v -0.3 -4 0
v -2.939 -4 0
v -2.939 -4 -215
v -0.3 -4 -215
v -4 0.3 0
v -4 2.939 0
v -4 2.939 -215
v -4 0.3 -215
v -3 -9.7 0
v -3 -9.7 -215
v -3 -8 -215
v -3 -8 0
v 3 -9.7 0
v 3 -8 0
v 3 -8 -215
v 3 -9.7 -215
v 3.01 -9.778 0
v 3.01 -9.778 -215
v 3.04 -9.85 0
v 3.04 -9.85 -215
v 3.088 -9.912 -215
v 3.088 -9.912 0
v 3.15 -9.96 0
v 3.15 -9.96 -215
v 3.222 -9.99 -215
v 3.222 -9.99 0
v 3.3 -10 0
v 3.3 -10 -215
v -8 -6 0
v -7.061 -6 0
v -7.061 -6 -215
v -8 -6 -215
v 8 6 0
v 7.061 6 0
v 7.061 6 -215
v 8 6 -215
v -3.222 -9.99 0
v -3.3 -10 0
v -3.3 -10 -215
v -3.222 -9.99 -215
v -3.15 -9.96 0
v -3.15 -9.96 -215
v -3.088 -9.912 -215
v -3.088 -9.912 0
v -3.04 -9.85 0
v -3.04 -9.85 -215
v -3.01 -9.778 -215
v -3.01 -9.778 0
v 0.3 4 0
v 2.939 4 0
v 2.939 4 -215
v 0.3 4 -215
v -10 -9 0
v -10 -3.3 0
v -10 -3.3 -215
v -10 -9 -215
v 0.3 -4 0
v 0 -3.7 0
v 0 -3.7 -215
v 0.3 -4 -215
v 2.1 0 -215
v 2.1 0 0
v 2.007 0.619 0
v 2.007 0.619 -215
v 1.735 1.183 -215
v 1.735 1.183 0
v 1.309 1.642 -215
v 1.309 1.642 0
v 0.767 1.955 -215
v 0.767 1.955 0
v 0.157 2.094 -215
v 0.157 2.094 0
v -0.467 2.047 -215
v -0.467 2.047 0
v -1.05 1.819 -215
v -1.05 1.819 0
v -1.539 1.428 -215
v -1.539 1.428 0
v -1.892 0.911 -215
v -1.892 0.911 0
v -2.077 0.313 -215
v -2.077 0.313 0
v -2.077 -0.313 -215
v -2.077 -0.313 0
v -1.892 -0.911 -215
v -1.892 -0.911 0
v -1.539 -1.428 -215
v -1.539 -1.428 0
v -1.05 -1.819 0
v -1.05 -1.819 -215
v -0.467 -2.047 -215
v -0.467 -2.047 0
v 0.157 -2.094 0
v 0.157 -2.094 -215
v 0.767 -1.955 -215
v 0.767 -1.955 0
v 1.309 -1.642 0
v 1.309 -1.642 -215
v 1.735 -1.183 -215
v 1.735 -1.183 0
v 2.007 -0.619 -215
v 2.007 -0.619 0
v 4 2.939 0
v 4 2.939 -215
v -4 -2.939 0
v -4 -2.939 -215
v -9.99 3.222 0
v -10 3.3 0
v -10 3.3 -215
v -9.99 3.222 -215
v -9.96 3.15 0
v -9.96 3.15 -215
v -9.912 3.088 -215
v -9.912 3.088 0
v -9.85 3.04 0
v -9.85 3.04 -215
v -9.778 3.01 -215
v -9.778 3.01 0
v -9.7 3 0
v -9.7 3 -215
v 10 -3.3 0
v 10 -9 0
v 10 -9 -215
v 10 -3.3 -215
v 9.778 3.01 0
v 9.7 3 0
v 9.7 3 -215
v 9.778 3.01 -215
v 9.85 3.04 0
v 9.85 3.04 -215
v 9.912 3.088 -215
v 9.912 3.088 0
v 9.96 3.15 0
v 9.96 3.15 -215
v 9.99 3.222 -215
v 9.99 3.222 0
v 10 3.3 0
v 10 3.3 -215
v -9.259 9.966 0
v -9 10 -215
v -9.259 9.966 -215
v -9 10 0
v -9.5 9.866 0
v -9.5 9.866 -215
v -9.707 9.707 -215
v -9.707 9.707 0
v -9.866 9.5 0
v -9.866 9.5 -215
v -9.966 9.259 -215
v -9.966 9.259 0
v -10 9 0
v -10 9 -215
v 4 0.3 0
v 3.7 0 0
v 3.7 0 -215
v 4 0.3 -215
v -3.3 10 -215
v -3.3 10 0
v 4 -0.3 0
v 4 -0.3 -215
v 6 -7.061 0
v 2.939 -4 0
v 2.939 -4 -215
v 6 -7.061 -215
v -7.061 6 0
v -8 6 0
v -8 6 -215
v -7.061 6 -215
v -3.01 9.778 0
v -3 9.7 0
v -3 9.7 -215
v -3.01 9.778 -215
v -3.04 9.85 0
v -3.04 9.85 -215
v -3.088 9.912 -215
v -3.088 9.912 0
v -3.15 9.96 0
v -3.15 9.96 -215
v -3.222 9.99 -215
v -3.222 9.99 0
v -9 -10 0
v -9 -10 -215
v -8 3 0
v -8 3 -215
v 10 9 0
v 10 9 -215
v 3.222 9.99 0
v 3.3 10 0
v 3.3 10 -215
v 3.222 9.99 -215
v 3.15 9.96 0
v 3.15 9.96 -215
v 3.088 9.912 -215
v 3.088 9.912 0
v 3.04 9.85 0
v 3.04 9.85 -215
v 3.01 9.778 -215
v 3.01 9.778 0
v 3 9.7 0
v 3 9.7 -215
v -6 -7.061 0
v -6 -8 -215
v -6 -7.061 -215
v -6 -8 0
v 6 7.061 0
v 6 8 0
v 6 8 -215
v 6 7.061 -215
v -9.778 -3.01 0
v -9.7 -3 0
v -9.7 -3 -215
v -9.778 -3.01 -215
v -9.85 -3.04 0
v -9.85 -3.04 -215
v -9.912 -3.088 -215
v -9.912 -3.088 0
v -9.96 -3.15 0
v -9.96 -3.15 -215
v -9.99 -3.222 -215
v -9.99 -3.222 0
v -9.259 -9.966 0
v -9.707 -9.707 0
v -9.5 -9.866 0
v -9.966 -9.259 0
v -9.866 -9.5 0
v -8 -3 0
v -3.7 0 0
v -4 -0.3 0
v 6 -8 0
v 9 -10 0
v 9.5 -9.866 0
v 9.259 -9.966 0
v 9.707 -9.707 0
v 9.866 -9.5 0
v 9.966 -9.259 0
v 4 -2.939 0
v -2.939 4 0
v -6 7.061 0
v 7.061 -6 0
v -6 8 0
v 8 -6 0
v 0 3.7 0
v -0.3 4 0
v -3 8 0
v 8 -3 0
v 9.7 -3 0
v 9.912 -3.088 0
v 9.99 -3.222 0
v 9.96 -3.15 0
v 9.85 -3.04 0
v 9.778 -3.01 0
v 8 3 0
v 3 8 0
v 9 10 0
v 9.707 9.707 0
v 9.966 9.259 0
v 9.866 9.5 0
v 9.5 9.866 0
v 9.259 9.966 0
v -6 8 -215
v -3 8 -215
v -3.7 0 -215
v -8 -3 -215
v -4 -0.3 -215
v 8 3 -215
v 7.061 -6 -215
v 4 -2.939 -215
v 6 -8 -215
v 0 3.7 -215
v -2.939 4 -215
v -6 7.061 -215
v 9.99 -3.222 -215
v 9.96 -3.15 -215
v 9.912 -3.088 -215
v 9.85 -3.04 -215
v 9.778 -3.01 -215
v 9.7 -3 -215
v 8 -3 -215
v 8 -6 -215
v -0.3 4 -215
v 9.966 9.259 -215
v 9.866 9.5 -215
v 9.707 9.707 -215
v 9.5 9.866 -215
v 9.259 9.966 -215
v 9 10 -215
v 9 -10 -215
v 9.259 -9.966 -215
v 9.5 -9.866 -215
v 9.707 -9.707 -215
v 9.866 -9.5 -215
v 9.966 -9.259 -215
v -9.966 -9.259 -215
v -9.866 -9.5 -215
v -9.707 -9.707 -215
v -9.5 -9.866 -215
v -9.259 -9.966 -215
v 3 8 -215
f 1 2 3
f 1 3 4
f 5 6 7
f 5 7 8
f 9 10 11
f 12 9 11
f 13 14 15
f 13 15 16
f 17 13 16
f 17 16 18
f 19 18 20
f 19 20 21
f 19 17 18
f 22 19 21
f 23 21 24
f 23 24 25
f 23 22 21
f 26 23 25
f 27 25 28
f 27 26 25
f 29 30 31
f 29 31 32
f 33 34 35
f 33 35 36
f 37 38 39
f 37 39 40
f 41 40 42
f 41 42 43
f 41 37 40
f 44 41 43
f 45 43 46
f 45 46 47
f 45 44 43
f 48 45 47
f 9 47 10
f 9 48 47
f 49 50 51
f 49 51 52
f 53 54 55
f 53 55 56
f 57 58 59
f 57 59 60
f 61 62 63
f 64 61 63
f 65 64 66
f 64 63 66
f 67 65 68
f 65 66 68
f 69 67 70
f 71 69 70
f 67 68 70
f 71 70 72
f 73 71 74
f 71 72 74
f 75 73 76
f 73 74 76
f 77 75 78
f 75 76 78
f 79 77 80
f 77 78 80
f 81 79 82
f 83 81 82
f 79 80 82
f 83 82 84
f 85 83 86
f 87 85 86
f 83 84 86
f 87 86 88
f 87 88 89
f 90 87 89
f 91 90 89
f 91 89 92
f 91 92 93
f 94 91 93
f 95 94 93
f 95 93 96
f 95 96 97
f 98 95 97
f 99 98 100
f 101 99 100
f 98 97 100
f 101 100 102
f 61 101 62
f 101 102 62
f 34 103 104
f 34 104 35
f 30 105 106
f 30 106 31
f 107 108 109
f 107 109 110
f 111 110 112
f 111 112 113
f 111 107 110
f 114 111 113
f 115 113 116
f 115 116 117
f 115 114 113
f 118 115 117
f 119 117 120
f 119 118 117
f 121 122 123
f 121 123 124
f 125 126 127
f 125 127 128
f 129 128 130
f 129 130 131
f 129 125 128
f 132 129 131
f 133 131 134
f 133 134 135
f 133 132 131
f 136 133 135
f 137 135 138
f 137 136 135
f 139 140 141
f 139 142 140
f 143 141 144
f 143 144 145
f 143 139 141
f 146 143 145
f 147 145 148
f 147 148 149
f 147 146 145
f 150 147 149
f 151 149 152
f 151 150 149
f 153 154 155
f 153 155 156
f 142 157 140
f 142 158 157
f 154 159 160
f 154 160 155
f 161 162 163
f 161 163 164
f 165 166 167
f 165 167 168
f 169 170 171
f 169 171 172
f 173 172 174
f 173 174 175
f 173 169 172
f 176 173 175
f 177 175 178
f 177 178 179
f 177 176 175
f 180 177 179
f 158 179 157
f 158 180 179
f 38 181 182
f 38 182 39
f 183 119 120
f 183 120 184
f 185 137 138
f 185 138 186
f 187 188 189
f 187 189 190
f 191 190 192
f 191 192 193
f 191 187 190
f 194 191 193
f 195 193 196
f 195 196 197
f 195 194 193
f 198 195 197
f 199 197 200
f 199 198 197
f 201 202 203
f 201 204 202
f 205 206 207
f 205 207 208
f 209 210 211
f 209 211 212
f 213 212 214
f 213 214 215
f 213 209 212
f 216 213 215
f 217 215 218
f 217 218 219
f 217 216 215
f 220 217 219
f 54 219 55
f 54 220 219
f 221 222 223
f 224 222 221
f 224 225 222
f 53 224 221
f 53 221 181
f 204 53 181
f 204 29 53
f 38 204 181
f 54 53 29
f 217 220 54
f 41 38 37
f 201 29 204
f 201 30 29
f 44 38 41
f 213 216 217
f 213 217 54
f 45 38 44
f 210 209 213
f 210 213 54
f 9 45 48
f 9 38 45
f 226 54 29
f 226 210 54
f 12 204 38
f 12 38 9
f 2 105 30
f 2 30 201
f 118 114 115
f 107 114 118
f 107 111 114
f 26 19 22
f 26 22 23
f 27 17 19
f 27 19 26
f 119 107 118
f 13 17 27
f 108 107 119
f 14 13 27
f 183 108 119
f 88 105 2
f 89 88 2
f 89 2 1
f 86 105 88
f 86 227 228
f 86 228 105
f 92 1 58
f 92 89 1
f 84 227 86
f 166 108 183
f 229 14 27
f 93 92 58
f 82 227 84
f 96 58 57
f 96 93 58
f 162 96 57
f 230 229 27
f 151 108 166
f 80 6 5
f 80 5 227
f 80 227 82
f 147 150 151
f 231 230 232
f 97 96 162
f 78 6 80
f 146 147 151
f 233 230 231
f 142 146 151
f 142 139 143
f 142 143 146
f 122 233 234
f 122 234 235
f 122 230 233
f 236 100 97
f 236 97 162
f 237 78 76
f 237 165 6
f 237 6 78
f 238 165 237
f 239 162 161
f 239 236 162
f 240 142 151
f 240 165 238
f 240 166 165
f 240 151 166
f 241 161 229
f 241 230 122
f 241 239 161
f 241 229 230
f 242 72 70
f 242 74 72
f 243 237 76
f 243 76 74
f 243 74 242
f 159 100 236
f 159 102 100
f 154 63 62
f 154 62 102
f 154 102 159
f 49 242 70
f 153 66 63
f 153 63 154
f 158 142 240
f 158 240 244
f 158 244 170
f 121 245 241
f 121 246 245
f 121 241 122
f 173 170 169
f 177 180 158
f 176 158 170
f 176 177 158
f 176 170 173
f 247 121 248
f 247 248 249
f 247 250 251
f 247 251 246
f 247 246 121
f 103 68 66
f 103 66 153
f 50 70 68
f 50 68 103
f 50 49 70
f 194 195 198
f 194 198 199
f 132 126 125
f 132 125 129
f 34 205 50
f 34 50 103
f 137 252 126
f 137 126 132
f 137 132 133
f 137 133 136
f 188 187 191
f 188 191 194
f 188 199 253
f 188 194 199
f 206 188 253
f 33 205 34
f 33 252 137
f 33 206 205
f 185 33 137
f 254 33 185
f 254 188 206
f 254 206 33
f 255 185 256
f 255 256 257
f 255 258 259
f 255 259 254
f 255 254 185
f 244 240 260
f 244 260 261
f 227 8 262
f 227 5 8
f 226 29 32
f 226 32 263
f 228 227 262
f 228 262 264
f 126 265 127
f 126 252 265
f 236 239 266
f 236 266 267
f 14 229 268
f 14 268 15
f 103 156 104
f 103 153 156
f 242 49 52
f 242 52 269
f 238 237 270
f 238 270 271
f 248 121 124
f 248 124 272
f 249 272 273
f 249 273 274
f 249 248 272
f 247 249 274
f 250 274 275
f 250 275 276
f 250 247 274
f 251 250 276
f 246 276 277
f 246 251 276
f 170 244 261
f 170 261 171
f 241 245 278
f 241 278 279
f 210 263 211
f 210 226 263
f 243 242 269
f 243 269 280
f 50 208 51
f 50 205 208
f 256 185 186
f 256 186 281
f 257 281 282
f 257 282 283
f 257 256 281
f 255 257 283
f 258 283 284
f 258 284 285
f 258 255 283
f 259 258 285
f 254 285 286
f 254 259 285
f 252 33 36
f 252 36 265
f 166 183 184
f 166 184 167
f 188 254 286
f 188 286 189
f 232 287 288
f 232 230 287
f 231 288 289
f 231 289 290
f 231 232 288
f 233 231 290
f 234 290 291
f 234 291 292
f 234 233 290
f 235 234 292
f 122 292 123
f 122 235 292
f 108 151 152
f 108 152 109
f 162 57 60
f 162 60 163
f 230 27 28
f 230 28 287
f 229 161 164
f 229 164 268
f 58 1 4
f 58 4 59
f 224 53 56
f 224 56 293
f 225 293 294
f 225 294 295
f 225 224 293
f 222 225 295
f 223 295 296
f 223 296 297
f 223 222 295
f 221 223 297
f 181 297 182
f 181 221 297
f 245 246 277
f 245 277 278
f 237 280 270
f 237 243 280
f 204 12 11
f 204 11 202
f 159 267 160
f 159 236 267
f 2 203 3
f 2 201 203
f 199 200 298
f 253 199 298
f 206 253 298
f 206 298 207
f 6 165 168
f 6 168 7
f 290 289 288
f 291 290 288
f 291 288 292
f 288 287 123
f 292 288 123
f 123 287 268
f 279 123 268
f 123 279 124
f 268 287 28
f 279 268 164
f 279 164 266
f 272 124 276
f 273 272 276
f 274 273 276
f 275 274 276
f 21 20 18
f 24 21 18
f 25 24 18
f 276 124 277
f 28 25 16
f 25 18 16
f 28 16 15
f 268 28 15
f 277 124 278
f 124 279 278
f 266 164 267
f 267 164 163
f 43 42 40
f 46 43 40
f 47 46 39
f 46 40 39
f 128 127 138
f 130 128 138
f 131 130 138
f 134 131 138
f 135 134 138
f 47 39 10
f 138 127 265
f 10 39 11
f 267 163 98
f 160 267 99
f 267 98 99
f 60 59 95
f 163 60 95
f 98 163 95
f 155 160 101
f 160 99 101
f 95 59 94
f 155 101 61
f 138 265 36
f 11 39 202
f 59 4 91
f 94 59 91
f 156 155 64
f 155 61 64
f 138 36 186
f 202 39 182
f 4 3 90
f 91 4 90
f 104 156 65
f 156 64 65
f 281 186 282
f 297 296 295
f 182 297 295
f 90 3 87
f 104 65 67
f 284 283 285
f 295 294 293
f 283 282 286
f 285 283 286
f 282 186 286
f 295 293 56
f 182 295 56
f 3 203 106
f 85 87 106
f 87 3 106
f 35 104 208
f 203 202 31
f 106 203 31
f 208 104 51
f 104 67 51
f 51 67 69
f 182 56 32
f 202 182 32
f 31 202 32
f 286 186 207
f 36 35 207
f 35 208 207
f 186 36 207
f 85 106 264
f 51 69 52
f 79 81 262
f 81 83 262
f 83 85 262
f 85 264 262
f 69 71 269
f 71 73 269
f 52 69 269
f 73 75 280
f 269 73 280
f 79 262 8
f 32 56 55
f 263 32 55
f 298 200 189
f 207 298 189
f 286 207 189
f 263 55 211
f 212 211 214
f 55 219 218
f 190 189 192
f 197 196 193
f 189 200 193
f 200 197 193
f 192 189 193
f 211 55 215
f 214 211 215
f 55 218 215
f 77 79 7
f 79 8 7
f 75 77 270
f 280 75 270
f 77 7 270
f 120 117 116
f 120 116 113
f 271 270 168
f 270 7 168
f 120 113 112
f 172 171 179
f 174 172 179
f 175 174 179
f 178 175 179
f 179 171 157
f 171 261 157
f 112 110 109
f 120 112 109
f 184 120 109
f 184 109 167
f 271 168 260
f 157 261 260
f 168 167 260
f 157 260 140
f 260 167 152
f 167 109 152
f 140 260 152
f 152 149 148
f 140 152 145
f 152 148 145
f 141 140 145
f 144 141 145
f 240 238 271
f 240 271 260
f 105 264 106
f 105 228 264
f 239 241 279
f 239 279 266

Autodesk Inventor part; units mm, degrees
sketch "Sketch_5" plane through (0, 0, 0) normal (0, 0, 1) x (1, 0, 0)
  arc A0 (-10, 3.3) -> (-9.7, 3) centre (-9.7, 3.3) ccw
  line L0 (-9.7, 3) -> (-8, 3)
  line L1 (-8, 3) -> (-8, 6)
  line L2 (-8, 6) -> (-7.0607, 6)
  line L3 (-7.0607, 6) -> (-4, 2.9393)
  line L4 (-4, 2.9393) -> (-4, 0.3)
  line L5 (-4, 0.3) -> (-3.7, 0)
  line L6 (-3.7, 0) -> (-4, -0.3)
  line L7 (-4, -0.3) -> (-4, -2.9393)
  line L8 (-4, -2.9393) -> (-7.0607, -6)
  line L9 (-7.0607, -6) -> (-8, -6)
  line L10 (-8, -6) -> (-8, -3)
  line L11 (-8, -3) -> (-9.7, -3)
  arc A1 (-9.7, -3) -> (-10, -3.3) centre (-9.7, -3.3) ccw
  line L12 (-10, -3.3) -> (-10, -9)
  arc A2 (-10, -9) -> (-9, -10) centre (-9, -9) ccw
  line L13 (-9, -10) -> (-3.3, -10)
  arc A3 (-3.3, -10) -> (-3, -9.7) centre (-3.3, -9.7) ccw
  line L14 (-3, -9.7) -> (-3, -8)
  line L15 (-3, -8) -> (-6, -8)
  line L16 (-6, -8) -> (-6, -7.0607)
  line L17 (-6, -7.0607) -> (-2.9393, -4)
  line L18 (-2.9393, -4) -> (-0.3, -4)
  line L19 (-0.3, -4) -> (0, -3.7)
  line L20 (0, -3.7) -> (0.3, -4)
  line L21 (0.3, -4) -> (2.9393, -4)
  line L22 (2.9393, -4) -> (6, -7.0607)
  line L23 (6, -7.0607) -> (6, -8)
  line L24 (6, -8) -> (3, -8)
  line L25 (3, -8) -> (3, -9.7)
  arc A4 (3, -9.7) -> (3.3, -10) centre (3.3, -9.7) ccw
  line L26 (3.3, -10) -> (9, -10)
  arc A5 (9, -10) -> (10, -9) centre (9, -9) ccw
  line L27 (10, -9) -> (10, -3.3)
  arc A6 (10, -3.3) -> (9.7, -3) centre (9.7, -3.3) ccw
  line L28 (9.7, -3) -> (8, -3)
  line L29 (8, -3) -> (8, -6)
  line L30 (8, -6) -> (7.0607, -6)
  line L31 (7.0607, -6) -> (4, -2.9393)
  line L32 (4, -2.9393) -> (4, -0.3)
  line L33 (4, -0.3) -> (3.7, 0)
  line L34 (3.7, 0) -> (4, 0.3)
  line L35 (4, 0.3) -> (4, 2.9393)
  line L36 (4, 2.9393) -> (7.0607, 6)
  line L37 (7.0607, 6) -> (8, 6)
  line L38 (8, 6) -> (8, 3)
  line L39 (8, 3) -> (9.7, 3)
  arc A7 (9.7, 3) -> (10, 3.3) centre (9.7, 3.3) ccw
  line L40 (10, 3.3) -> (10, 9)
  arc A8 (10, 9) -> (9, 10) centre (9, 9) ccw
  line L41 (9, 10) -> (3.3, 10)
  arc A9 (3.3, 10) -> (3, 9.7) centre (3.3, 9.7) ccw
  line L42 (3, 9.7) -> (3, 8)
  line L43 (3, 8) -> (6, 8)
  line L44 (6, 8) -> (6, 7.0607)
  line L45 (6, 7.0607) -> (2.9393, 4)
  line L46 (2.9393, 4) -> (0.3, 4)
  line L47 (0.3, 4) -> (0, 3.7)
  line L48 (0, 3.7) -> (-0.3, 4)
  line L49 (-0.3, 4) -> (-2.9393, 4)
  line L50 (-2.9393, 4) -> (-6, 7.0607)
  line L51 (-6, 7.0607) -> (-6, 8)
  line L52 (-6, 8) -> (-3, 8)
  line L53 (-3, 8) -> (-3, 9.7)
  arc A10 (-3, 9.7) -> (-3.3, 10) centre (-3.3, 9.7) ccw
  line L54 (-3.3, 10) -> (-9, 10)
  arc A11 (-9, 10) -> (-10, 9) centre (-9, 9) ccw
  line L55 (-10, 9) -> (-10, 3.3)
  circle A12 centre (0, 0) radius 2.1
extrude "Extrusion1" add sketch "Sketch_5" against normal blind 1000
ref_plane "to_frame_XY" through (0, 0, 0) normal (0, 0, 1) x (1, 0, 0)
ref_plane "to_frame_YZ" through (0, 0, 0) normal (1, 0, 0) x (0, 1, 0)
ref_plane "to_frame_ZX" through (0, 0, 0) normal (0, 1, 0) x (0, 0, 1)
sketch "Sketch2" plane through (-10, -3.3, -1000) normal (-1, 0, 0) x (0, 0, 1)
  line L0 (-212.6604, -150.7885) -> (785, -150.7885)
  line L1 (785, -150.7885) -> (785, 147.9074)
  line L2 (785, 147.9074) -> (-212.6604, 147.9074)
  line L3 (-212.6604, 147.9074) -> (-212.6604, -150.7885)
  point P0 (1000, 3.3)
  dimension "d3" = 215
extrude "Extrusion2" cut sketch "Sketch2" against normal through all
equation "\"d0\" = L"
equation "\"L\" = 1000"
properties part number "KHFS5-2020-1000"
